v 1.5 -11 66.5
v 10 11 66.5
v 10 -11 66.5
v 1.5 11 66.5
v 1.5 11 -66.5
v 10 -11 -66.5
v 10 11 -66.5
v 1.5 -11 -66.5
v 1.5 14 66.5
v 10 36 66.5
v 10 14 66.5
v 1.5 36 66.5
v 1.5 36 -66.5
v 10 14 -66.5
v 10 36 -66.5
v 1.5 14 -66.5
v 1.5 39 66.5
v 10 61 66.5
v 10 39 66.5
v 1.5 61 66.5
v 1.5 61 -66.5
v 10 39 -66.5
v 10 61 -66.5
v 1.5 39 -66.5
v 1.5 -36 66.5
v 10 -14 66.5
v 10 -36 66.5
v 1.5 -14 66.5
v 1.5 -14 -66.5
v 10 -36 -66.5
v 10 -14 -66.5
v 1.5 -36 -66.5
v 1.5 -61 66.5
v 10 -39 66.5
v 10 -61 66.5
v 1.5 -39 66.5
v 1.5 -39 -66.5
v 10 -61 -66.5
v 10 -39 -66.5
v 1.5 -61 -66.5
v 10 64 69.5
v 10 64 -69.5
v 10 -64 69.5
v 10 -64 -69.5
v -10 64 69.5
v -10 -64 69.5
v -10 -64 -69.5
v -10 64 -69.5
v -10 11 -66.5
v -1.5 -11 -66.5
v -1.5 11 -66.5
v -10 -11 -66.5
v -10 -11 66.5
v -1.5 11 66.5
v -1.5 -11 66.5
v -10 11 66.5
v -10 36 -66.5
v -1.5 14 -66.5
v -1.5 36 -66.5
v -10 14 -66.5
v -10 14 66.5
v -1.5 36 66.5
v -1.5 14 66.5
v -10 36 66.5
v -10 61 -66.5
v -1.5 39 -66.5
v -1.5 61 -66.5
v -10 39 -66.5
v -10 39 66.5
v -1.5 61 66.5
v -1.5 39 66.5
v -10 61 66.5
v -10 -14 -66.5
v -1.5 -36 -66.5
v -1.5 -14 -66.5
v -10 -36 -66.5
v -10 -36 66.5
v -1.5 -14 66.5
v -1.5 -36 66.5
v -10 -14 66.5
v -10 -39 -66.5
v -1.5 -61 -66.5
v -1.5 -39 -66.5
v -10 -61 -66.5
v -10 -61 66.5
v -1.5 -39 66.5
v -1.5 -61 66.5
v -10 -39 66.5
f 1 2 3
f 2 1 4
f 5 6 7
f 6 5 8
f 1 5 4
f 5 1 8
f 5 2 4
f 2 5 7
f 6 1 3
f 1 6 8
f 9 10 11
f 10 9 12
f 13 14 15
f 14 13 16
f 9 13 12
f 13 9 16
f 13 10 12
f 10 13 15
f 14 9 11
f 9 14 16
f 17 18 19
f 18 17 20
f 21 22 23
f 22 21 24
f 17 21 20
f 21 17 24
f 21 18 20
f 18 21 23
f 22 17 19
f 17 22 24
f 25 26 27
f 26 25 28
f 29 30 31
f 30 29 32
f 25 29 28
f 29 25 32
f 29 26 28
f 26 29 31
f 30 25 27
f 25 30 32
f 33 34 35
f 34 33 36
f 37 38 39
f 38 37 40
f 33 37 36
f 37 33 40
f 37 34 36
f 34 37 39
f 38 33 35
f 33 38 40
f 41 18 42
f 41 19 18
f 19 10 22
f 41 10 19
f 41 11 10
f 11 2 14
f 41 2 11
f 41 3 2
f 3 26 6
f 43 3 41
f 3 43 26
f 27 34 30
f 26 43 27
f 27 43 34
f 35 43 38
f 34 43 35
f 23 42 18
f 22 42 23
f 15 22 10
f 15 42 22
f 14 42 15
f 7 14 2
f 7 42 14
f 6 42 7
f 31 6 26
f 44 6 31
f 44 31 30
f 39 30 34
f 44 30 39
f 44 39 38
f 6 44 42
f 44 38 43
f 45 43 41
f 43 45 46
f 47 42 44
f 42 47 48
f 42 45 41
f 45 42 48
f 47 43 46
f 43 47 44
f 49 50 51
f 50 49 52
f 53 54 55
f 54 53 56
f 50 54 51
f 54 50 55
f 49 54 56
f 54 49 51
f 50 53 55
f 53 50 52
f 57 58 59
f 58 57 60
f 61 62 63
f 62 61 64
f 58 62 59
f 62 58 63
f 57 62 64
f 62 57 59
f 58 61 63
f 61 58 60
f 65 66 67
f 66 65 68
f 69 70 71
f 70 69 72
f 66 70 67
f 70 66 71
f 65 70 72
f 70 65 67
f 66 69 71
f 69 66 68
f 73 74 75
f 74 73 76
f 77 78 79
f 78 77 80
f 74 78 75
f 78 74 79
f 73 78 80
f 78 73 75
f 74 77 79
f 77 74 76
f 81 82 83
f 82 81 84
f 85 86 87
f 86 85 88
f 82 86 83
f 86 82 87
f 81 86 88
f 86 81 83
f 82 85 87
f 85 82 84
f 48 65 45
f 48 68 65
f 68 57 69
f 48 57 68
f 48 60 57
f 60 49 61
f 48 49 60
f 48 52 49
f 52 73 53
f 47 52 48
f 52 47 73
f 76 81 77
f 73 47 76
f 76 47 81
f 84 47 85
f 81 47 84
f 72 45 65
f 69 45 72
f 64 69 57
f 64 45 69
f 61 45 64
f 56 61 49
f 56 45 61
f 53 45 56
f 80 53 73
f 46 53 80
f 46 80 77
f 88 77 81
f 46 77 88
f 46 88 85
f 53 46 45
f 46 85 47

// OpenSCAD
translate([5, 0, 0]) base();
translate([-5, 0, 0]) rotate([0, 180, 0]) base();

//translate([35, 0, 0]) boulderpack25v();
//translate([-35, 0, 0]) boulderpack25v();


module boulderpack () { 
  cube([63, 22, 133], center = true); 
}

module boulderpack25v() {
  boulderpack();
  translate([0, 25, 0]) boulderpack();
  translate([0, 50, 0]) boulderpack();
  translate([0, -25, 0]) boulderpack();
  translate([0, -50, 0]) boulderpack();    
}

module base() {
  difference() {
    translate([[0, 0, 0]]) cube([10, 128, 139], center = true);
    translate([28, 0, 0]) boulderpack25v();
  }
}
